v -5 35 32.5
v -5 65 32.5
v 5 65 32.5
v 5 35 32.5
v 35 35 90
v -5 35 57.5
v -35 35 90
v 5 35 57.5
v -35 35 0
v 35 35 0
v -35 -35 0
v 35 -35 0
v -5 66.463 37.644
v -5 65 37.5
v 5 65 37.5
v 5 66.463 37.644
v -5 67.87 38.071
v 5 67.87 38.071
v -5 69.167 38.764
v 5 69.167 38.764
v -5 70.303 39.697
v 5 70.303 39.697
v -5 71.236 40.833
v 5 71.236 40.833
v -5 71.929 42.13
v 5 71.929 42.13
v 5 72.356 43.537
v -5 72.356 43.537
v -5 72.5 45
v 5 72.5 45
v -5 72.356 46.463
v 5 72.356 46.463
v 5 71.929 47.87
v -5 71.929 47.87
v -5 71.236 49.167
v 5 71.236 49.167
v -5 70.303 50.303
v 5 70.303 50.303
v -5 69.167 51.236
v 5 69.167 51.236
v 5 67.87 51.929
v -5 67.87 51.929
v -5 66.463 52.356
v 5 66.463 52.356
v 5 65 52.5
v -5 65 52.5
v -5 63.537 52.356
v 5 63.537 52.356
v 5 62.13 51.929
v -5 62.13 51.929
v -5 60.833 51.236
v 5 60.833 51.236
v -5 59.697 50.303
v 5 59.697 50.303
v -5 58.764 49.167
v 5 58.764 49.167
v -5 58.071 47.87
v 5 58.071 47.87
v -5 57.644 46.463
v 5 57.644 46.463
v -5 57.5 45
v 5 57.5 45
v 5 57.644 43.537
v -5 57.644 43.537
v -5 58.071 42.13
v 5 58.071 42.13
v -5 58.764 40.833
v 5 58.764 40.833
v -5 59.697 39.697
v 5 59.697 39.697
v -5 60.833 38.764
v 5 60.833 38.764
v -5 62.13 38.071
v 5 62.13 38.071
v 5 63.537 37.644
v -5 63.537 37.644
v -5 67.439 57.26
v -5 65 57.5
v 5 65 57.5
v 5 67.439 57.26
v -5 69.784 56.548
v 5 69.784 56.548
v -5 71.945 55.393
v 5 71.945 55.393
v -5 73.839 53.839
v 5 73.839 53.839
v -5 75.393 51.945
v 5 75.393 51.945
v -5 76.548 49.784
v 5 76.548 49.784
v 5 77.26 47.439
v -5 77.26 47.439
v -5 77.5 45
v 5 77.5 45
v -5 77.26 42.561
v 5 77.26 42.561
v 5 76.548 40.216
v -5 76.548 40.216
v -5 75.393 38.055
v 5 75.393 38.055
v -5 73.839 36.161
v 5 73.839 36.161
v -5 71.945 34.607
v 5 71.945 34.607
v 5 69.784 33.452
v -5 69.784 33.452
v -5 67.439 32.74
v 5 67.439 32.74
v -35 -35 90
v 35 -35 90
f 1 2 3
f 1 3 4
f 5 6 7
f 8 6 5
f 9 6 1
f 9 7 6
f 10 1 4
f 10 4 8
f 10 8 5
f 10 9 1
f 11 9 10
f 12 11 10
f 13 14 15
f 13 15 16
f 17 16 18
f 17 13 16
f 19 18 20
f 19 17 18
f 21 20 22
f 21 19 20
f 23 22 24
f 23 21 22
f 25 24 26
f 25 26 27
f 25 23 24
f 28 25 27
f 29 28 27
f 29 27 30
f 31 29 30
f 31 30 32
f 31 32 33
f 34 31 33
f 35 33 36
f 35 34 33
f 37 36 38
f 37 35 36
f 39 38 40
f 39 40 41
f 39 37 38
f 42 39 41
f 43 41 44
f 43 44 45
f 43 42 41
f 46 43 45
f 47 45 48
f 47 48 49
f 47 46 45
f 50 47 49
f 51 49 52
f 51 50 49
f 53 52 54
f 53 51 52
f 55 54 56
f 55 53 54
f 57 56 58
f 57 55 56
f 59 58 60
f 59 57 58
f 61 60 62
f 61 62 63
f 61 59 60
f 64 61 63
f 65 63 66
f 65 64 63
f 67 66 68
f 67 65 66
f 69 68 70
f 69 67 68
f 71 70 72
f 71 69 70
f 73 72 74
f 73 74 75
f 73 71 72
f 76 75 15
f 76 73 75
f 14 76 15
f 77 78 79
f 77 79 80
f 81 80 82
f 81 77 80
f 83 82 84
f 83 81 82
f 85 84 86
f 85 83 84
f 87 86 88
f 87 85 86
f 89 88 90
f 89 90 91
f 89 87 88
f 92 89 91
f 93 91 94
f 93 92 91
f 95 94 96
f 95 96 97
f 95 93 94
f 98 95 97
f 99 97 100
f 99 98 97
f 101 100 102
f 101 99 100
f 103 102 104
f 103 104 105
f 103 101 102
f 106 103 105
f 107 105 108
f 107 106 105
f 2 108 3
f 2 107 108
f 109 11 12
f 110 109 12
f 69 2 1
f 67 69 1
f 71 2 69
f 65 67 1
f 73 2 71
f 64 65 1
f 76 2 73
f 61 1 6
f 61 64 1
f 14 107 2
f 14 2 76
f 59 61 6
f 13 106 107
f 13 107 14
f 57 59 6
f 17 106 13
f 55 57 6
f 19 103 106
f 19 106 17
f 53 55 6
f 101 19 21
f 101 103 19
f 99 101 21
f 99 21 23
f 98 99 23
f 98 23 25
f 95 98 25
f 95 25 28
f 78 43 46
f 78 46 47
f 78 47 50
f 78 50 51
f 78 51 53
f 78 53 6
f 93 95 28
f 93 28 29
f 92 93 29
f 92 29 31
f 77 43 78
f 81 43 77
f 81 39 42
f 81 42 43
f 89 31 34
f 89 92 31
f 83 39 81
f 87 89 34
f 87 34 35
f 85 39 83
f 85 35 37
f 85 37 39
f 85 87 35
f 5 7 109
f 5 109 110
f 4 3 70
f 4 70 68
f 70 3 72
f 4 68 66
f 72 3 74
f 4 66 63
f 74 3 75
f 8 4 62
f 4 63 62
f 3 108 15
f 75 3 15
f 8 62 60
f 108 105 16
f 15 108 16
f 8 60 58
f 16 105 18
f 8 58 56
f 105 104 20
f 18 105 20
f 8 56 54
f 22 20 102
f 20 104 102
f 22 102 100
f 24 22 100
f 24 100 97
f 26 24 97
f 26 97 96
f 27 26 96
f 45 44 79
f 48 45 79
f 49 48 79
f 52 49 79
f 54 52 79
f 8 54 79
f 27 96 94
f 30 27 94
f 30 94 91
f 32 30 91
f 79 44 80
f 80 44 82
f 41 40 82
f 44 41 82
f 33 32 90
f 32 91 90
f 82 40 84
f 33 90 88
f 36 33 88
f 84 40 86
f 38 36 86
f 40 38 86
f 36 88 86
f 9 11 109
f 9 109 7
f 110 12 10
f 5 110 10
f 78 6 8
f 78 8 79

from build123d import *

# Parameters (mm, degrees)
ESQUISSE1_W             = 70
ESQUISSE1_H             = 70
BOSS_EXTRU_1_DEPTH      = 90
BOSS_EXTRU_2_DEPTH      = 5
BOSS_EXTRU_2_DEPTH_BACK = 5
ESQUISSE2_R             = 7.5


with BuildPart() as part:
    # Esquisse1 → Boss.-Extru.1 (new body)
    with BuildSketch(Plane.XY):
        Rectangle(ESQUISSE1_W, ESQUISSE1_H)
    extrude(amount=BOSS_EXTRU_1_DEPTH)

    # Esquisse2 → Boss.-Extru.2 (add, two sides: drawn at the far end of the back side and taken through both)
    with BuildSketch(Plane(origin=(0, 0, 0), x_dir=(0, 0, -1), z_dir=(1, 0, 0)).offset(-BOSS_EXTRU_2_DEPTH_BACK)):
        with BuildLine():
            Line((-57.5, 35), (-57.5, 65))
            ThreePointArc((-57.5, 65), (-45, 77.5), (-32.5, 65))
            Line((-32.5, 65), (-32.5, 35))
            Line((-32.5, 35), (-57.5, 35))
        make_face()
        with Locations((-45, 65)):
            Circle(ESQUISSE2_R, mode=Mode.SUBTRACT)
    extrude(amount=BOSS_EXTRU_2_DEPTH + BOSS_EXTRU_2_DEPTH_BACK)


solid = part.part
